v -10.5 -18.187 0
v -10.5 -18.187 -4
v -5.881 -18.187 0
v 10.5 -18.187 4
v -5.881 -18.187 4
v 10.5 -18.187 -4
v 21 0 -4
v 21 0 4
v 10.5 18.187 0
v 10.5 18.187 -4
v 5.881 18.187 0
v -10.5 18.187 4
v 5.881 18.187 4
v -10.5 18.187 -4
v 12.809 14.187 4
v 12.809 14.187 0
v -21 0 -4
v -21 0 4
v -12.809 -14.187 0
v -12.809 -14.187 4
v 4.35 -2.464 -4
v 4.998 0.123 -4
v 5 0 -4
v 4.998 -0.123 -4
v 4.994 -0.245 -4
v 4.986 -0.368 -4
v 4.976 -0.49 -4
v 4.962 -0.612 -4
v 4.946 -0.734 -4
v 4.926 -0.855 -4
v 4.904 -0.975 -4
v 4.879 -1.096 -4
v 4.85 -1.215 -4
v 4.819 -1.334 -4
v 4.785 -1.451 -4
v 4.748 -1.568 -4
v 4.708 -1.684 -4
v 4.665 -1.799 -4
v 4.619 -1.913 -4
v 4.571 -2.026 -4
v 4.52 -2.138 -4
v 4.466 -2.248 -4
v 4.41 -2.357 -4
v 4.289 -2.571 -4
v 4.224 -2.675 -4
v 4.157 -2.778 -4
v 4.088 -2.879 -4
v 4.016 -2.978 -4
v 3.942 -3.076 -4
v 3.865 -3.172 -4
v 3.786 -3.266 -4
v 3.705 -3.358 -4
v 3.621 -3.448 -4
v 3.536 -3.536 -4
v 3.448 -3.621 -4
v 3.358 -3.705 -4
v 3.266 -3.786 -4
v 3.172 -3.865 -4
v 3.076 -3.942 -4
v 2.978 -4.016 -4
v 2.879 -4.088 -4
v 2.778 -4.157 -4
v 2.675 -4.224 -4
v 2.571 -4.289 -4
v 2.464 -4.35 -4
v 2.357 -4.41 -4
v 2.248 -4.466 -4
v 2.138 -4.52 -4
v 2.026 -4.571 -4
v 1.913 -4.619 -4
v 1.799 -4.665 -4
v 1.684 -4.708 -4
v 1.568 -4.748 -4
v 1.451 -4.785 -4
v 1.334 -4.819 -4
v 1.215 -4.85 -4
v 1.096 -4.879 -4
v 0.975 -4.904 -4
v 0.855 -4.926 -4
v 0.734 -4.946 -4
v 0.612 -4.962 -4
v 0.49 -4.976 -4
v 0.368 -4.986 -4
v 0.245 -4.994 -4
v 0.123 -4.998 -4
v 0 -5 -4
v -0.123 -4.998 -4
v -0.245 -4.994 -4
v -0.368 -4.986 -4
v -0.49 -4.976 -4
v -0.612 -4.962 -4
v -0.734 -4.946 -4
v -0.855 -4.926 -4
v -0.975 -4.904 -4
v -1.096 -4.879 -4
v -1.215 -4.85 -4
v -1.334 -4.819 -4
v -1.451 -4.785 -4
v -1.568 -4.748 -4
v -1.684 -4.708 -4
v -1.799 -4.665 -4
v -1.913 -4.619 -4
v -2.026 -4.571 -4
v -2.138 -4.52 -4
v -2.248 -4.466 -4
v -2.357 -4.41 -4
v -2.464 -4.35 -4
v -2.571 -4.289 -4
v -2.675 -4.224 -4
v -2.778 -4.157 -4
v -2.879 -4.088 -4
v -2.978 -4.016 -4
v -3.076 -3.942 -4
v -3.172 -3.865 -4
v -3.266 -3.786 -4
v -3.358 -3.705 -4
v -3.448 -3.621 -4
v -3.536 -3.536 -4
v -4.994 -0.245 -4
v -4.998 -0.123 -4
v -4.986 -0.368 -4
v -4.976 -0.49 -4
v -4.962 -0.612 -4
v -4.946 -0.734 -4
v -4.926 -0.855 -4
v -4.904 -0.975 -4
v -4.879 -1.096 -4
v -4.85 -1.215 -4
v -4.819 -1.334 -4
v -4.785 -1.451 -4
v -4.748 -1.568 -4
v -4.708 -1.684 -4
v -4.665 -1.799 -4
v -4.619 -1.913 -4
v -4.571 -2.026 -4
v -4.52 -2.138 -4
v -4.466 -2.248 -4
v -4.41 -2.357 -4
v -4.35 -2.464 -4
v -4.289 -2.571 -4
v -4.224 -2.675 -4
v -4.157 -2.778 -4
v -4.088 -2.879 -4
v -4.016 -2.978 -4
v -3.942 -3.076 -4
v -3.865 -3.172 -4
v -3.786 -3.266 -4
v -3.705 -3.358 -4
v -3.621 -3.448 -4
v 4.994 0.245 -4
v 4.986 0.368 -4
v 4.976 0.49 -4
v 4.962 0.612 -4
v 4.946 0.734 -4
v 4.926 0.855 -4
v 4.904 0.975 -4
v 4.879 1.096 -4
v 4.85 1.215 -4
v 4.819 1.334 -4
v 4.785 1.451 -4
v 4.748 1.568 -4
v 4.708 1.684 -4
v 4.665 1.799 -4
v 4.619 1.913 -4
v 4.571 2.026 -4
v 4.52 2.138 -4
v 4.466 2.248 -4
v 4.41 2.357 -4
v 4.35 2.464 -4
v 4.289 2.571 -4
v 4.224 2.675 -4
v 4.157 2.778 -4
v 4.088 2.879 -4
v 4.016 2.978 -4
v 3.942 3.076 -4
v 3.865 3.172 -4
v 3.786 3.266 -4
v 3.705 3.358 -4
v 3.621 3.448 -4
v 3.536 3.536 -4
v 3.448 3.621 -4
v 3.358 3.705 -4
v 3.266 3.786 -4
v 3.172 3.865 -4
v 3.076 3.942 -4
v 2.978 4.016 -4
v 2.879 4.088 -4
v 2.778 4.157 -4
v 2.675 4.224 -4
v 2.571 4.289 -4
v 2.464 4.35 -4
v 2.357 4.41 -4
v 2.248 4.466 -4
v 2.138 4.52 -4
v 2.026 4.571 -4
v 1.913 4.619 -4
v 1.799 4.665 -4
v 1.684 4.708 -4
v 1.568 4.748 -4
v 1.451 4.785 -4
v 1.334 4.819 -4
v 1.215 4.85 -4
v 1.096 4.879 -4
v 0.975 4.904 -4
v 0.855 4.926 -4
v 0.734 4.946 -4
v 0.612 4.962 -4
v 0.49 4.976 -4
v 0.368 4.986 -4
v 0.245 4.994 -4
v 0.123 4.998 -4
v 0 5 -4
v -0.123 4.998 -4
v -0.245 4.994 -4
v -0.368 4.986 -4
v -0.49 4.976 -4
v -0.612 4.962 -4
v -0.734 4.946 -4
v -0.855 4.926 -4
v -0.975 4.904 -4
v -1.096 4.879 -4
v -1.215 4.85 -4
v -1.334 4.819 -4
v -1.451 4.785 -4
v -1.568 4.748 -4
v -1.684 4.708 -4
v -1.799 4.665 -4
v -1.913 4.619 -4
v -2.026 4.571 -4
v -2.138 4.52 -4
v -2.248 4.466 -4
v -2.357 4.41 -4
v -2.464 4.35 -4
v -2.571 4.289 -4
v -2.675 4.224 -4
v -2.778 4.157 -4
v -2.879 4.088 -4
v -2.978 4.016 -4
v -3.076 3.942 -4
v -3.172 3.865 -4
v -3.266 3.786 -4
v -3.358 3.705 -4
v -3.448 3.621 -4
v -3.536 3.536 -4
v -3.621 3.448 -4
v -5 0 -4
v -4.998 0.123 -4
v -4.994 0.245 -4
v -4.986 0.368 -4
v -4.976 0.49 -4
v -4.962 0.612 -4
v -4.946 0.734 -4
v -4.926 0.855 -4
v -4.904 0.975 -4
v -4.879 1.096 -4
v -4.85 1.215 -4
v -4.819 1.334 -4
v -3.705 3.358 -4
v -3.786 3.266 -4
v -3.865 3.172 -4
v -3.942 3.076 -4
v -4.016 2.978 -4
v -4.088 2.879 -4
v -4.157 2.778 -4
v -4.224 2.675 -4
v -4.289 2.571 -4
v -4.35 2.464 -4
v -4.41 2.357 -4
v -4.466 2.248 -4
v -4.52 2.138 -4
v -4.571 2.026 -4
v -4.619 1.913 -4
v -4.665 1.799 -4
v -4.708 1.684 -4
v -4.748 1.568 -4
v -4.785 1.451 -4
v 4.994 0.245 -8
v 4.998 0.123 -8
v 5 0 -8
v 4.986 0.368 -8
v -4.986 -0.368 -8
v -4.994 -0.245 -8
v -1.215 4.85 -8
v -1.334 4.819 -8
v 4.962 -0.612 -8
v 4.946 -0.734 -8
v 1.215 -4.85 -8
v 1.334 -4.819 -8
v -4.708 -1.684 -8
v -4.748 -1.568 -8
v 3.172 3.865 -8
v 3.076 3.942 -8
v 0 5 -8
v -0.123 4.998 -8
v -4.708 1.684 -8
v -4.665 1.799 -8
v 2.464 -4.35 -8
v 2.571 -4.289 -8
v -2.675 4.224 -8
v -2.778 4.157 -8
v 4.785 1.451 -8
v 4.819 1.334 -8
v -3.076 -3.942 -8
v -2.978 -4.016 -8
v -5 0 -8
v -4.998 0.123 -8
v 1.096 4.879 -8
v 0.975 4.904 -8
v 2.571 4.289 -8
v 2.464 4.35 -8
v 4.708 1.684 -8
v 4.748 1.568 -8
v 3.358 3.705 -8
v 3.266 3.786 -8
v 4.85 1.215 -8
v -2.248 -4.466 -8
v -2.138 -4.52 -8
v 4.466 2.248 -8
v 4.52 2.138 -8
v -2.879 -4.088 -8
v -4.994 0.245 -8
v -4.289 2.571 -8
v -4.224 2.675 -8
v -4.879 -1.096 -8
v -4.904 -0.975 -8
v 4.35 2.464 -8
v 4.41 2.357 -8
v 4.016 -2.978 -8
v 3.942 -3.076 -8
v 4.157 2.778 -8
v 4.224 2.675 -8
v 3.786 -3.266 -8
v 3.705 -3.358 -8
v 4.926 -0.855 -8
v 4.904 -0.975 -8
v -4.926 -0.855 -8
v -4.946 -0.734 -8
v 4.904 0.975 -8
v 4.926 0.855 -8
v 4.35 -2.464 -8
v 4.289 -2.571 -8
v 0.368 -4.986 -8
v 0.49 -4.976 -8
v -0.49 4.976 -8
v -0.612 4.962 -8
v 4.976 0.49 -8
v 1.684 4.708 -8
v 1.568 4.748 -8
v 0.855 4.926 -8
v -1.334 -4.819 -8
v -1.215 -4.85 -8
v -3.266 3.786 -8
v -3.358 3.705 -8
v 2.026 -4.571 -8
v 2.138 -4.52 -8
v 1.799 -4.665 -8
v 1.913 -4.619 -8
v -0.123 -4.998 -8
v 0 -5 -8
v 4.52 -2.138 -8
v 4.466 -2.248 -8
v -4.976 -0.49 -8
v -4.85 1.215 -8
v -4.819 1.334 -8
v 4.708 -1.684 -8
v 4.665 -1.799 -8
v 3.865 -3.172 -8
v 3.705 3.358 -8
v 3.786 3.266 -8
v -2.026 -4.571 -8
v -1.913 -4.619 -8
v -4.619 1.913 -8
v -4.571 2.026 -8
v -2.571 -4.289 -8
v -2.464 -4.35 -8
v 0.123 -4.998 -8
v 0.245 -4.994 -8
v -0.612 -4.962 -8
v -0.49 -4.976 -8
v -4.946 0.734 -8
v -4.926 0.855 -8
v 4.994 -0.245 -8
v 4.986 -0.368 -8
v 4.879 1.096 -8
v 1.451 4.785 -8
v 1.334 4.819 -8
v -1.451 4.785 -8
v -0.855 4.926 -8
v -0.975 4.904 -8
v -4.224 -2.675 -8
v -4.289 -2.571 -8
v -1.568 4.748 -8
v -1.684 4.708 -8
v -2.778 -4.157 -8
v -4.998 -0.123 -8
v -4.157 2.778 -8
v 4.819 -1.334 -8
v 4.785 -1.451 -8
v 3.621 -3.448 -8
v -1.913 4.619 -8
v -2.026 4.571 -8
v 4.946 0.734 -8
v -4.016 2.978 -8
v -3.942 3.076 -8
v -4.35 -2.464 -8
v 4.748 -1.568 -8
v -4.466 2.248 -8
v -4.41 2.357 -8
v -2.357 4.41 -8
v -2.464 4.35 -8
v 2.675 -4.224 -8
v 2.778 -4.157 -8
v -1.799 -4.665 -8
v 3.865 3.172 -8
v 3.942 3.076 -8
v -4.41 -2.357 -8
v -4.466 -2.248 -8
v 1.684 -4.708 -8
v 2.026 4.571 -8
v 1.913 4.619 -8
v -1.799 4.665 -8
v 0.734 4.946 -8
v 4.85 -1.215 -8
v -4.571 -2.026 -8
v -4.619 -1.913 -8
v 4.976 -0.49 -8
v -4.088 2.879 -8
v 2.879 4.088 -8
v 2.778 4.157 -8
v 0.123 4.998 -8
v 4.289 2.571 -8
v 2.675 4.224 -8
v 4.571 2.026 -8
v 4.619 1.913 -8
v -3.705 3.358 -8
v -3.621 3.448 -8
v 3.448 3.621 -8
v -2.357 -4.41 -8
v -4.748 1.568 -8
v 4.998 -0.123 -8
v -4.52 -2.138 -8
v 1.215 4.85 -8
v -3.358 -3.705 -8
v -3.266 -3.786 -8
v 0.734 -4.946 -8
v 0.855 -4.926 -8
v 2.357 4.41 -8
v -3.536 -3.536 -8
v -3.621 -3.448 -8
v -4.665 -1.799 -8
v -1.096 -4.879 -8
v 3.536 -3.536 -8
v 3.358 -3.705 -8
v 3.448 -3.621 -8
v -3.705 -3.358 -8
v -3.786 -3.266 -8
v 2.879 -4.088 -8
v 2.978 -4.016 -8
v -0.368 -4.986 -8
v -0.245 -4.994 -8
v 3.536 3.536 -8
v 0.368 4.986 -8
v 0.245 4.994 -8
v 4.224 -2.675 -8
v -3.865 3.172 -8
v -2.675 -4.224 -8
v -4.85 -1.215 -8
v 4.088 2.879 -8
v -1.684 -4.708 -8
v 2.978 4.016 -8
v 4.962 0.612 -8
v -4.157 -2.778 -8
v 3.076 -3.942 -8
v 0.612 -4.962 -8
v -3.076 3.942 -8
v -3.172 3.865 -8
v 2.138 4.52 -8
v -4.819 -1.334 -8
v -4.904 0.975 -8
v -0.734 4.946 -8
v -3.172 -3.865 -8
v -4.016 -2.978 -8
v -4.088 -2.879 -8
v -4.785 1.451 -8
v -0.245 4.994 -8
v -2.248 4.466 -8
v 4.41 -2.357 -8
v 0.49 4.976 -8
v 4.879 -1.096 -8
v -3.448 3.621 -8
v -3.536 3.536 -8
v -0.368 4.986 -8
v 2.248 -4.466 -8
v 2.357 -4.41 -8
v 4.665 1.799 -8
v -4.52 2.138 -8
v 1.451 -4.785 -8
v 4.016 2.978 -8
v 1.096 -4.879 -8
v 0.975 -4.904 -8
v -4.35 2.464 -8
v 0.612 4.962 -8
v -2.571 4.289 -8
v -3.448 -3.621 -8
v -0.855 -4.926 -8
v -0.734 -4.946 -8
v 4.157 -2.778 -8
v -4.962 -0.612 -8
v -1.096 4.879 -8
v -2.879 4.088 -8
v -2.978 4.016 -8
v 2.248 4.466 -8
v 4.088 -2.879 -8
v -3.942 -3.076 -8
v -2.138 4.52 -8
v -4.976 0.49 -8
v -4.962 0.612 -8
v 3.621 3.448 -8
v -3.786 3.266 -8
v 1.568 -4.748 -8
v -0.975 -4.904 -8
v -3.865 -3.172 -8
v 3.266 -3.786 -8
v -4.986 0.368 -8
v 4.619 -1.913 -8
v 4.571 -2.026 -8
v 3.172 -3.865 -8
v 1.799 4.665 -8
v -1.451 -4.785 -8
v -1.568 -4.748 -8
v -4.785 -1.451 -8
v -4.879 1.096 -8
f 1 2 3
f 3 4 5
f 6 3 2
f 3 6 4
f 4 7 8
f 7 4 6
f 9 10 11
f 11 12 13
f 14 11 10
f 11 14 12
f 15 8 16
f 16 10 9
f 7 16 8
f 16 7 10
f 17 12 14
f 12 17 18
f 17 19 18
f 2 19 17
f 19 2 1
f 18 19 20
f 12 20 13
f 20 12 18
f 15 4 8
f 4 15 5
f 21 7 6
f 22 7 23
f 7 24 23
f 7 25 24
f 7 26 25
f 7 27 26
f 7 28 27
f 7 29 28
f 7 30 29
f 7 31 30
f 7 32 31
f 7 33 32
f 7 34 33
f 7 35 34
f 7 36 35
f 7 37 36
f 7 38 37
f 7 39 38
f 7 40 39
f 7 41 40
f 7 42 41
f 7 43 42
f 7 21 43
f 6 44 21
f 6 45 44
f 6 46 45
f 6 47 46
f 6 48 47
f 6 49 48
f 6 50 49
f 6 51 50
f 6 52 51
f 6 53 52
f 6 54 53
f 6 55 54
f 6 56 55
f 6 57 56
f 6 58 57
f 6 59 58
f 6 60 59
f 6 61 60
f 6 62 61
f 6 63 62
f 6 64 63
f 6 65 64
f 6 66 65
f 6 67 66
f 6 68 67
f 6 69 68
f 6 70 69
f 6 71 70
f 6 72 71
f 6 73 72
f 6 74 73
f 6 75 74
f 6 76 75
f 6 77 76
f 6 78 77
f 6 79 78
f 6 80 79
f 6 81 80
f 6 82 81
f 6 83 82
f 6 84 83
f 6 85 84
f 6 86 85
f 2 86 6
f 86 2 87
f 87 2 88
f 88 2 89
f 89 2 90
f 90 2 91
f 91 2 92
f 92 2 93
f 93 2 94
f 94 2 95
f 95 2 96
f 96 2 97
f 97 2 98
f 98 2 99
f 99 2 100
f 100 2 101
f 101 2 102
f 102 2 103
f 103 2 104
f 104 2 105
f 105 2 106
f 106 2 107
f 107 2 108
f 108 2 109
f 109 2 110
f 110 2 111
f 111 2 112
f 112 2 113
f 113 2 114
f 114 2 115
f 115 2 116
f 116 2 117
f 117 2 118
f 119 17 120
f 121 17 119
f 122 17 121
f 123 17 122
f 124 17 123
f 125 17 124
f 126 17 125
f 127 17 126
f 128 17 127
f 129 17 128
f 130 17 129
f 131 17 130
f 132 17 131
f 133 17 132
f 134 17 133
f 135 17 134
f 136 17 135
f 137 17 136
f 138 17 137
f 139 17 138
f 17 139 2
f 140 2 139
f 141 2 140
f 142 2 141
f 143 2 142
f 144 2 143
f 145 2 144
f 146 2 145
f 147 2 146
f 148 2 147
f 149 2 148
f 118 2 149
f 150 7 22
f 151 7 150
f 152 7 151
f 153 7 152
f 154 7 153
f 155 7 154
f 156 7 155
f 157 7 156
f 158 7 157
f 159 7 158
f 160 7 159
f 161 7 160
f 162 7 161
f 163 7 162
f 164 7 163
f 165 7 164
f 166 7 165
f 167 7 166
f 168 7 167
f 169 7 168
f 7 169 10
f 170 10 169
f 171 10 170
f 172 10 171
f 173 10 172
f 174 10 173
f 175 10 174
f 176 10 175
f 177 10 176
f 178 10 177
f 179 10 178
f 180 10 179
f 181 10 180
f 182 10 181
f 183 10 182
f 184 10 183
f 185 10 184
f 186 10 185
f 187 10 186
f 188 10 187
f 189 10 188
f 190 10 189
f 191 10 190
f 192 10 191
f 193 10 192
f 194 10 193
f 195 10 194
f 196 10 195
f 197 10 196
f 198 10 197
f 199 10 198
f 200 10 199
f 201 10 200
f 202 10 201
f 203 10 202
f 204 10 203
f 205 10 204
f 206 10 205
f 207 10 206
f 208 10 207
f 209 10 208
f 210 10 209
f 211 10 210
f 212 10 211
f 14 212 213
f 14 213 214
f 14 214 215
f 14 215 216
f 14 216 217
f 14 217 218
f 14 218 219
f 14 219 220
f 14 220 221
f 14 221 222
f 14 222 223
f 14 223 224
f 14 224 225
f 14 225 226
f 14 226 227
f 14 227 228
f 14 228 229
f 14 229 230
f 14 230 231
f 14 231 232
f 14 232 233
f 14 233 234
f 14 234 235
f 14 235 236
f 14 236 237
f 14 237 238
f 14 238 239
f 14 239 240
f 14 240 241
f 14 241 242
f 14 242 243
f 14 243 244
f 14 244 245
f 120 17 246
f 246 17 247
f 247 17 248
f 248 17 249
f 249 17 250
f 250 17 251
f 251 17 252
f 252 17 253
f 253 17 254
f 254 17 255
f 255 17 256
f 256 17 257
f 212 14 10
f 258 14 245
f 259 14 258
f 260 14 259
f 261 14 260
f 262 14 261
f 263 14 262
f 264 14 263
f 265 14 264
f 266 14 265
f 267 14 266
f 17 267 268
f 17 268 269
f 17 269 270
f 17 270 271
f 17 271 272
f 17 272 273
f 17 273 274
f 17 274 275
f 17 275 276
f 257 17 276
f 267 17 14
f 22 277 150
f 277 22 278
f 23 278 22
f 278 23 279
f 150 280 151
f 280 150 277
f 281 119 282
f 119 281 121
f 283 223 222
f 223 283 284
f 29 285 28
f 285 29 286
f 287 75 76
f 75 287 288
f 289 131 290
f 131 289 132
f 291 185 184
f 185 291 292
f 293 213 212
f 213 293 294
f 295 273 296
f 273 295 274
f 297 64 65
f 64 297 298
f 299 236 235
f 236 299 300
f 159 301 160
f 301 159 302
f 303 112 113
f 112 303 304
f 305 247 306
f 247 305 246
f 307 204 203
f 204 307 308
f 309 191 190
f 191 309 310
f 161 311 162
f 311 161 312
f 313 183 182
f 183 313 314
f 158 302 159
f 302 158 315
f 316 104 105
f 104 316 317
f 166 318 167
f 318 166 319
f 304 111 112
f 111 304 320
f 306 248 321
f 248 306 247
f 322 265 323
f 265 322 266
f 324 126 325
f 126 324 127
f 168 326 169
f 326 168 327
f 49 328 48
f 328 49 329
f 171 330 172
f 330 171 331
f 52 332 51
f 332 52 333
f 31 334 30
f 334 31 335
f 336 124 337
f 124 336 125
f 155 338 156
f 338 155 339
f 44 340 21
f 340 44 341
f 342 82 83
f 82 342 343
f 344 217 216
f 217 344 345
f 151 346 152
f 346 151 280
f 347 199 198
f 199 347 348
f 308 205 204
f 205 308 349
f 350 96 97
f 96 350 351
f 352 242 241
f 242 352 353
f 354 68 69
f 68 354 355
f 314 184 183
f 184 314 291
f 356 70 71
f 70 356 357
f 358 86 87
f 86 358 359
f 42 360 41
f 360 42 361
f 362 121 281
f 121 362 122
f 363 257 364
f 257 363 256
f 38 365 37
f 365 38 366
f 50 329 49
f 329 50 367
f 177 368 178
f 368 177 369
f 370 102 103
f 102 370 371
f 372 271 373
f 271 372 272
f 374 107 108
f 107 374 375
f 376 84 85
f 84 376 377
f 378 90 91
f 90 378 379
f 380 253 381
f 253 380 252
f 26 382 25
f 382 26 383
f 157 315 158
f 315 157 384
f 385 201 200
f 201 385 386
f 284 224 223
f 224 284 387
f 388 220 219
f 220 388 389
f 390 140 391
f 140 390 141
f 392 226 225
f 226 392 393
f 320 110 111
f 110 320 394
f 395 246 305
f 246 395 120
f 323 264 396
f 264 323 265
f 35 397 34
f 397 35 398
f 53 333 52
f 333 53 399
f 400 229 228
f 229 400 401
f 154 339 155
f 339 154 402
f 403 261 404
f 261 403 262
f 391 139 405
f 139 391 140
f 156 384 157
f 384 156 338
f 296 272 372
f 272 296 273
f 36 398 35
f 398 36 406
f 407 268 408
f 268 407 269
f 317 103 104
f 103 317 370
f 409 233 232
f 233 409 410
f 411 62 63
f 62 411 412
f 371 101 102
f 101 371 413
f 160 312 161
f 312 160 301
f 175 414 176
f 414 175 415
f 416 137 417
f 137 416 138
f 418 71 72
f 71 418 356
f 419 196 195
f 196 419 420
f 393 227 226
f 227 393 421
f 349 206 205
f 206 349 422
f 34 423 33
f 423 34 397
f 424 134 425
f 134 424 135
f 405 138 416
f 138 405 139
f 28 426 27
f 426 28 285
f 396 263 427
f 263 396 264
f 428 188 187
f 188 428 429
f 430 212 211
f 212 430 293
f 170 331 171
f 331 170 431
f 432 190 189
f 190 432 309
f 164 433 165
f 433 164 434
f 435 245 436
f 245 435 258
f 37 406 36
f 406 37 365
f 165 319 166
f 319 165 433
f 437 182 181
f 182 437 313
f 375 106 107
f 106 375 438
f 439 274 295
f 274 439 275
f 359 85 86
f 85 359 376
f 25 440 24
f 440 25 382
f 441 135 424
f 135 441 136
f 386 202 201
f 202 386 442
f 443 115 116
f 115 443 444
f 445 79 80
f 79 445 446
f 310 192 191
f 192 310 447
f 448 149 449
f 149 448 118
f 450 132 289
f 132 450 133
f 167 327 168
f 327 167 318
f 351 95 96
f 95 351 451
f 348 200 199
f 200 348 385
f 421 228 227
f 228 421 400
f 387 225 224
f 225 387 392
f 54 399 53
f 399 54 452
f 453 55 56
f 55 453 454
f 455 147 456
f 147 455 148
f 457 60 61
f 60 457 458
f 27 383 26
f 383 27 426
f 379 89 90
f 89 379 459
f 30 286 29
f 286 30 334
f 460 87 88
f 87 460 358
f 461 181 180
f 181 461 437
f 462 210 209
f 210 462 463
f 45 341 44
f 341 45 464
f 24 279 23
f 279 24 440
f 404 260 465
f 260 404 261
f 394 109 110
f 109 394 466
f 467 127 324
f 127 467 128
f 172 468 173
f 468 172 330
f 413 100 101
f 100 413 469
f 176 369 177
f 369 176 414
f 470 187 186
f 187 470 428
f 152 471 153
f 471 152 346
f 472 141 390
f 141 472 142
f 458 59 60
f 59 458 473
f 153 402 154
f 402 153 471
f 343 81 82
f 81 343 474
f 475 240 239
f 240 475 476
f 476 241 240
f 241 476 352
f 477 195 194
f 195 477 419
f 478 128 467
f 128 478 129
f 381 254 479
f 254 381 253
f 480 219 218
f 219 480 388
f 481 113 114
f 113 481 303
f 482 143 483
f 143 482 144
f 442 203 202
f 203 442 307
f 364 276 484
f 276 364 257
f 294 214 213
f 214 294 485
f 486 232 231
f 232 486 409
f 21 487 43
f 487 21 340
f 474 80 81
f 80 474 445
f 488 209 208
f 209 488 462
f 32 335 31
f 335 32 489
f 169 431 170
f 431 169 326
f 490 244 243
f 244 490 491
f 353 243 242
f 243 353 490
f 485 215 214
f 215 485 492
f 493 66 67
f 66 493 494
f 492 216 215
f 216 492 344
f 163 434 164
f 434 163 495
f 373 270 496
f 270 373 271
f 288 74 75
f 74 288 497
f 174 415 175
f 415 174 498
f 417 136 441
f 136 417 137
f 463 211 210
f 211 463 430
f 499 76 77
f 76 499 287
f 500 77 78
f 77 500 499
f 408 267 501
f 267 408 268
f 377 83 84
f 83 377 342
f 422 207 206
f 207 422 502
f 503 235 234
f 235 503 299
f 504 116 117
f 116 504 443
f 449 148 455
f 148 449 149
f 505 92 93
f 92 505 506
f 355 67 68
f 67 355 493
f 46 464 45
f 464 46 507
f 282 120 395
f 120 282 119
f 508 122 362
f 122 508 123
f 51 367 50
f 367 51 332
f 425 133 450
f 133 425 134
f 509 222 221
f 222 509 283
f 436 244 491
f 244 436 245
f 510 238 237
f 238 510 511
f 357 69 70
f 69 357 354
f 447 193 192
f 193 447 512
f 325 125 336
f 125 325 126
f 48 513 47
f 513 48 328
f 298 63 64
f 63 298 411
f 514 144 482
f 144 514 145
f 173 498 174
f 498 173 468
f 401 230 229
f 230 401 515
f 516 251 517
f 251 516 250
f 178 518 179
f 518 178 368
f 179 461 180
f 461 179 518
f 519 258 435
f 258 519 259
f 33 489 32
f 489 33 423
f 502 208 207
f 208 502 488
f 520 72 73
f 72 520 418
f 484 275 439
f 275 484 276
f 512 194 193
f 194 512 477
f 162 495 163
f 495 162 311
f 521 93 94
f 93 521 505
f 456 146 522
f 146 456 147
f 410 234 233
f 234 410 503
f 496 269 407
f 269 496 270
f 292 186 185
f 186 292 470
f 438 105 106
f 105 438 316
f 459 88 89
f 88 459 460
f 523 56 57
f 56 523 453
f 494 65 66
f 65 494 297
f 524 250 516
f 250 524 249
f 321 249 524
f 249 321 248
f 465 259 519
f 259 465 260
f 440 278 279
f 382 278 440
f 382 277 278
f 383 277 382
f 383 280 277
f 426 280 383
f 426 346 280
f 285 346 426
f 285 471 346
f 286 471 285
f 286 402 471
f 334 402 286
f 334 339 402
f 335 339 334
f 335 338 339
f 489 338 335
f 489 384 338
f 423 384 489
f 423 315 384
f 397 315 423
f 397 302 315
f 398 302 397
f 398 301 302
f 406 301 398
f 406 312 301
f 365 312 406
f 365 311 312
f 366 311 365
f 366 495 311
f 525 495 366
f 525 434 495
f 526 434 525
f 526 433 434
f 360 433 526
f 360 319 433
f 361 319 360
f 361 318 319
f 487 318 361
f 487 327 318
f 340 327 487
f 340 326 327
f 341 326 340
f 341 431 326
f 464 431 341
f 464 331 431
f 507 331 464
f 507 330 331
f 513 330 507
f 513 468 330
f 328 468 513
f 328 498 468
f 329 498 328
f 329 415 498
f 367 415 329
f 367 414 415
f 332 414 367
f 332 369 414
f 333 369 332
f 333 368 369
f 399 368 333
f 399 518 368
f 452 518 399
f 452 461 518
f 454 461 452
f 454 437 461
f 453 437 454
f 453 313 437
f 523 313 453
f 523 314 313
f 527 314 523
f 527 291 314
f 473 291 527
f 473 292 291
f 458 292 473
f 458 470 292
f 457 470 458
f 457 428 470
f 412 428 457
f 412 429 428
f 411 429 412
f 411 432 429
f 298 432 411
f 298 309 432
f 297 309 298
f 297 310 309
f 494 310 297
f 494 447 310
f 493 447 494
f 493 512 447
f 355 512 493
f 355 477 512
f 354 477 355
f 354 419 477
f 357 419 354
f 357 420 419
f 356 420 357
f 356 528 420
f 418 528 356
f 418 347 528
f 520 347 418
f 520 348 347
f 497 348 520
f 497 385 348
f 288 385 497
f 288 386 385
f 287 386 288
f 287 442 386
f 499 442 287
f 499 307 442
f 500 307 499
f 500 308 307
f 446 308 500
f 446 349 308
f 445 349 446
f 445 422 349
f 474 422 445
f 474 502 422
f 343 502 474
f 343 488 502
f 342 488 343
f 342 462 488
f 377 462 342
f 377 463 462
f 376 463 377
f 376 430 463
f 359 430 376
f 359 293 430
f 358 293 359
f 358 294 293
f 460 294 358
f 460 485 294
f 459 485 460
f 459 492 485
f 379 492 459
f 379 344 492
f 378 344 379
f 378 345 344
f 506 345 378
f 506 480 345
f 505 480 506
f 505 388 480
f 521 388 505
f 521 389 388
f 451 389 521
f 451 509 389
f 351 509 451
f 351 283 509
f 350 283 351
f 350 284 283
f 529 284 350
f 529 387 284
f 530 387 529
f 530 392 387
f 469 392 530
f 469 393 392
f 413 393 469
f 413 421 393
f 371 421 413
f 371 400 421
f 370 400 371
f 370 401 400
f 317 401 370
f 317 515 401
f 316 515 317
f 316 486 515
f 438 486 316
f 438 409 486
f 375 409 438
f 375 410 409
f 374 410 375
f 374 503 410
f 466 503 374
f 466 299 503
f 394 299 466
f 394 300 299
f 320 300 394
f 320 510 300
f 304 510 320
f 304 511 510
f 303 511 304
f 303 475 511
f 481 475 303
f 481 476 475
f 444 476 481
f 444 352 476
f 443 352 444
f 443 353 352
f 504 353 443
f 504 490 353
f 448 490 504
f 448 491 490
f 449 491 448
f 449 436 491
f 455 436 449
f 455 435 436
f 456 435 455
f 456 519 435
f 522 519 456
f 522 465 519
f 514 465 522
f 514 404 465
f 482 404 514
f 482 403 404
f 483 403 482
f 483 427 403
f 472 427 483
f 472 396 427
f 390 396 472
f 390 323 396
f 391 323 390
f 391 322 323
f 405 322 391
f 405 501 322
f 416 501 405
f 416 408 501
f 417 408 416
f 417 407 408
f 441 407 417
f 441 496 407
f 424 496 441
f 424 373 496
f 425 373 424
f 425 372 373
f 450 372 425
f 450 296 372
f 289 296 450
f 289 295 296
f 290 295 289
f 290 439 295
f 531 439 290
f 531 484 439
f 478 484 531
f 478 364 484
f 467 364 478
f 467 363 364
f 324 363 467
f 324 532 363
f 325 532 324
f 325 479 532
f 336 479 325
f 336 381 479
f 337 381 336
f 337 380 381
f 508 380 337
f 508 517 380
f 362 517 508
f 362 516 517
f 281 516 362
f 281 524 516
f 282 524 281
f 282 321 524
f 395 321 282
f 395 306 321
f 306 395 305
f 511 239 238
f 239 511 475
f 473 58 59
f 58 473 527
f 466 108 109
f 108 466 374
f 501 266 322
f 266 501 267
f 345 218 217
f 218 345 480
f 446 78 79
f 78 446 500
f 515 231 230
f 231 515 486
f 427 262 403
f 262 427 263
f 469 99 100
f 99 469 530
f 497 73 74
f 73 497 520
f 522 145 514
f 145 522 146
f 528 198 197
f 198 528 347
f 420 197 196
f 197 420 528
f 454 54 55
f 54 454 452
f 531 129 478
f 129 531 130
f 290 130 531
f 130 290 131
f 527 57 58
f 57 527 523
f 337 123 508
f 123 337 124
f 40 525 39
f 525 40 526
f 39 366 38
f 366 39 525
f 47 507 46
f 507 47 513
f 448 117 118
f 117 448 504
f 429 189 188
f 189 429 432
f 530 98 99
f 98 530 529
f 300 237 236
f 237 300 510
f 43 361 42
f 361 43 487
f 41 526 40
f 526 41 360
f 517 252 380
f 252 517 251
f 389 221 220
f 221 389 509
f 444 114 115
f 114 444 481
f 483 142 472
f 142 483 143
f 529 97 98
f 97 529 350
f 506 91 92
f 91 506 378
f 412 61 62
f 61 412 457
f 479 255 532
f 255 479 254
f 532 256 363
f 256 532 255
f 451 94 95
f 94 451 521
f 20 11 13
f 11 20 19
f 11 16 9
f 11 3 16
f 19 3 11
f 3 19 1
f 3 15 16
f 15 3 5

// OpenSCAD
difference() {
	translate(v = [0, 0, 0]) {
		rotate(a = [0, 0, 0]) {
			union() {
				translate(v = [0, 0, 0]) {
					rotate(a = [0, 0, 0]) {
						cylinder($fn = 6, center = true, h = 8, r1 = 21, r2 = 21);
					}
				}
				translate(v = [0, 0, -6.0000000000]) {
					rotate(a = [0, 0, 0]) {
						cylinder($fn = 256, center = true, h = 4, r1 = 5, r2 = 5);
					}
				}
			}
		}
	}
	translate(v = [0, 0, 4.0000000000]) {
		rotate(a = [0, 0, 60]) {
			cube(center = true, size = [63, 8, 8]);
		}
	}
}
/***********************************************
*********      SolidPython code:      **********
************************************************
 
__author__ = 'Mark Weinreuter'

from config import *

mirror_thickness = 8

cut = C(block_r_mm * 3, mirror_thickness, block_base_h_mm)
cut.rz = 90
cut.z = block_base_h_mm / 2
base = make_base()

mir_tile1 = base - cut
cut.rz = 60
mir_tile2 = base - cut

# holes_rots = (60, 60 + 180, 60 + 90, (60 + 90 + 180))
# holes = []
# for rot in holes_rots:
#    holes.append(
#        up(block_base_h_mm / 2)(rotate([0, 0, rot])(left(connector_dist_mm)(cylinder(connector_r_mm, h=block_base_h_mm, center=True, segments=256)))))


cable_hole = cylinder(cable_r_mm, h=block_base_h_mm * 10, center=True)
# base -= cable_hole
# for h in holes:
#    base -= h

turret_w = 30
turret_height = 50
turret_th = 10
t = cube([turret_w, turret_w, turret_height], center=True)
t_cutout = cube([turret_w - 2 * turret_th, turret_w, turret_height], center=True)
t -= translate([0, turret_th, -turret_th])(t_cutout)

base = make_base()
base -= cut

scad_render_to_file(t, "scad/block_turret.scad")
scad_render_to_file(base, "scad/blocker_base2.scad")
 
 
************************************************/
